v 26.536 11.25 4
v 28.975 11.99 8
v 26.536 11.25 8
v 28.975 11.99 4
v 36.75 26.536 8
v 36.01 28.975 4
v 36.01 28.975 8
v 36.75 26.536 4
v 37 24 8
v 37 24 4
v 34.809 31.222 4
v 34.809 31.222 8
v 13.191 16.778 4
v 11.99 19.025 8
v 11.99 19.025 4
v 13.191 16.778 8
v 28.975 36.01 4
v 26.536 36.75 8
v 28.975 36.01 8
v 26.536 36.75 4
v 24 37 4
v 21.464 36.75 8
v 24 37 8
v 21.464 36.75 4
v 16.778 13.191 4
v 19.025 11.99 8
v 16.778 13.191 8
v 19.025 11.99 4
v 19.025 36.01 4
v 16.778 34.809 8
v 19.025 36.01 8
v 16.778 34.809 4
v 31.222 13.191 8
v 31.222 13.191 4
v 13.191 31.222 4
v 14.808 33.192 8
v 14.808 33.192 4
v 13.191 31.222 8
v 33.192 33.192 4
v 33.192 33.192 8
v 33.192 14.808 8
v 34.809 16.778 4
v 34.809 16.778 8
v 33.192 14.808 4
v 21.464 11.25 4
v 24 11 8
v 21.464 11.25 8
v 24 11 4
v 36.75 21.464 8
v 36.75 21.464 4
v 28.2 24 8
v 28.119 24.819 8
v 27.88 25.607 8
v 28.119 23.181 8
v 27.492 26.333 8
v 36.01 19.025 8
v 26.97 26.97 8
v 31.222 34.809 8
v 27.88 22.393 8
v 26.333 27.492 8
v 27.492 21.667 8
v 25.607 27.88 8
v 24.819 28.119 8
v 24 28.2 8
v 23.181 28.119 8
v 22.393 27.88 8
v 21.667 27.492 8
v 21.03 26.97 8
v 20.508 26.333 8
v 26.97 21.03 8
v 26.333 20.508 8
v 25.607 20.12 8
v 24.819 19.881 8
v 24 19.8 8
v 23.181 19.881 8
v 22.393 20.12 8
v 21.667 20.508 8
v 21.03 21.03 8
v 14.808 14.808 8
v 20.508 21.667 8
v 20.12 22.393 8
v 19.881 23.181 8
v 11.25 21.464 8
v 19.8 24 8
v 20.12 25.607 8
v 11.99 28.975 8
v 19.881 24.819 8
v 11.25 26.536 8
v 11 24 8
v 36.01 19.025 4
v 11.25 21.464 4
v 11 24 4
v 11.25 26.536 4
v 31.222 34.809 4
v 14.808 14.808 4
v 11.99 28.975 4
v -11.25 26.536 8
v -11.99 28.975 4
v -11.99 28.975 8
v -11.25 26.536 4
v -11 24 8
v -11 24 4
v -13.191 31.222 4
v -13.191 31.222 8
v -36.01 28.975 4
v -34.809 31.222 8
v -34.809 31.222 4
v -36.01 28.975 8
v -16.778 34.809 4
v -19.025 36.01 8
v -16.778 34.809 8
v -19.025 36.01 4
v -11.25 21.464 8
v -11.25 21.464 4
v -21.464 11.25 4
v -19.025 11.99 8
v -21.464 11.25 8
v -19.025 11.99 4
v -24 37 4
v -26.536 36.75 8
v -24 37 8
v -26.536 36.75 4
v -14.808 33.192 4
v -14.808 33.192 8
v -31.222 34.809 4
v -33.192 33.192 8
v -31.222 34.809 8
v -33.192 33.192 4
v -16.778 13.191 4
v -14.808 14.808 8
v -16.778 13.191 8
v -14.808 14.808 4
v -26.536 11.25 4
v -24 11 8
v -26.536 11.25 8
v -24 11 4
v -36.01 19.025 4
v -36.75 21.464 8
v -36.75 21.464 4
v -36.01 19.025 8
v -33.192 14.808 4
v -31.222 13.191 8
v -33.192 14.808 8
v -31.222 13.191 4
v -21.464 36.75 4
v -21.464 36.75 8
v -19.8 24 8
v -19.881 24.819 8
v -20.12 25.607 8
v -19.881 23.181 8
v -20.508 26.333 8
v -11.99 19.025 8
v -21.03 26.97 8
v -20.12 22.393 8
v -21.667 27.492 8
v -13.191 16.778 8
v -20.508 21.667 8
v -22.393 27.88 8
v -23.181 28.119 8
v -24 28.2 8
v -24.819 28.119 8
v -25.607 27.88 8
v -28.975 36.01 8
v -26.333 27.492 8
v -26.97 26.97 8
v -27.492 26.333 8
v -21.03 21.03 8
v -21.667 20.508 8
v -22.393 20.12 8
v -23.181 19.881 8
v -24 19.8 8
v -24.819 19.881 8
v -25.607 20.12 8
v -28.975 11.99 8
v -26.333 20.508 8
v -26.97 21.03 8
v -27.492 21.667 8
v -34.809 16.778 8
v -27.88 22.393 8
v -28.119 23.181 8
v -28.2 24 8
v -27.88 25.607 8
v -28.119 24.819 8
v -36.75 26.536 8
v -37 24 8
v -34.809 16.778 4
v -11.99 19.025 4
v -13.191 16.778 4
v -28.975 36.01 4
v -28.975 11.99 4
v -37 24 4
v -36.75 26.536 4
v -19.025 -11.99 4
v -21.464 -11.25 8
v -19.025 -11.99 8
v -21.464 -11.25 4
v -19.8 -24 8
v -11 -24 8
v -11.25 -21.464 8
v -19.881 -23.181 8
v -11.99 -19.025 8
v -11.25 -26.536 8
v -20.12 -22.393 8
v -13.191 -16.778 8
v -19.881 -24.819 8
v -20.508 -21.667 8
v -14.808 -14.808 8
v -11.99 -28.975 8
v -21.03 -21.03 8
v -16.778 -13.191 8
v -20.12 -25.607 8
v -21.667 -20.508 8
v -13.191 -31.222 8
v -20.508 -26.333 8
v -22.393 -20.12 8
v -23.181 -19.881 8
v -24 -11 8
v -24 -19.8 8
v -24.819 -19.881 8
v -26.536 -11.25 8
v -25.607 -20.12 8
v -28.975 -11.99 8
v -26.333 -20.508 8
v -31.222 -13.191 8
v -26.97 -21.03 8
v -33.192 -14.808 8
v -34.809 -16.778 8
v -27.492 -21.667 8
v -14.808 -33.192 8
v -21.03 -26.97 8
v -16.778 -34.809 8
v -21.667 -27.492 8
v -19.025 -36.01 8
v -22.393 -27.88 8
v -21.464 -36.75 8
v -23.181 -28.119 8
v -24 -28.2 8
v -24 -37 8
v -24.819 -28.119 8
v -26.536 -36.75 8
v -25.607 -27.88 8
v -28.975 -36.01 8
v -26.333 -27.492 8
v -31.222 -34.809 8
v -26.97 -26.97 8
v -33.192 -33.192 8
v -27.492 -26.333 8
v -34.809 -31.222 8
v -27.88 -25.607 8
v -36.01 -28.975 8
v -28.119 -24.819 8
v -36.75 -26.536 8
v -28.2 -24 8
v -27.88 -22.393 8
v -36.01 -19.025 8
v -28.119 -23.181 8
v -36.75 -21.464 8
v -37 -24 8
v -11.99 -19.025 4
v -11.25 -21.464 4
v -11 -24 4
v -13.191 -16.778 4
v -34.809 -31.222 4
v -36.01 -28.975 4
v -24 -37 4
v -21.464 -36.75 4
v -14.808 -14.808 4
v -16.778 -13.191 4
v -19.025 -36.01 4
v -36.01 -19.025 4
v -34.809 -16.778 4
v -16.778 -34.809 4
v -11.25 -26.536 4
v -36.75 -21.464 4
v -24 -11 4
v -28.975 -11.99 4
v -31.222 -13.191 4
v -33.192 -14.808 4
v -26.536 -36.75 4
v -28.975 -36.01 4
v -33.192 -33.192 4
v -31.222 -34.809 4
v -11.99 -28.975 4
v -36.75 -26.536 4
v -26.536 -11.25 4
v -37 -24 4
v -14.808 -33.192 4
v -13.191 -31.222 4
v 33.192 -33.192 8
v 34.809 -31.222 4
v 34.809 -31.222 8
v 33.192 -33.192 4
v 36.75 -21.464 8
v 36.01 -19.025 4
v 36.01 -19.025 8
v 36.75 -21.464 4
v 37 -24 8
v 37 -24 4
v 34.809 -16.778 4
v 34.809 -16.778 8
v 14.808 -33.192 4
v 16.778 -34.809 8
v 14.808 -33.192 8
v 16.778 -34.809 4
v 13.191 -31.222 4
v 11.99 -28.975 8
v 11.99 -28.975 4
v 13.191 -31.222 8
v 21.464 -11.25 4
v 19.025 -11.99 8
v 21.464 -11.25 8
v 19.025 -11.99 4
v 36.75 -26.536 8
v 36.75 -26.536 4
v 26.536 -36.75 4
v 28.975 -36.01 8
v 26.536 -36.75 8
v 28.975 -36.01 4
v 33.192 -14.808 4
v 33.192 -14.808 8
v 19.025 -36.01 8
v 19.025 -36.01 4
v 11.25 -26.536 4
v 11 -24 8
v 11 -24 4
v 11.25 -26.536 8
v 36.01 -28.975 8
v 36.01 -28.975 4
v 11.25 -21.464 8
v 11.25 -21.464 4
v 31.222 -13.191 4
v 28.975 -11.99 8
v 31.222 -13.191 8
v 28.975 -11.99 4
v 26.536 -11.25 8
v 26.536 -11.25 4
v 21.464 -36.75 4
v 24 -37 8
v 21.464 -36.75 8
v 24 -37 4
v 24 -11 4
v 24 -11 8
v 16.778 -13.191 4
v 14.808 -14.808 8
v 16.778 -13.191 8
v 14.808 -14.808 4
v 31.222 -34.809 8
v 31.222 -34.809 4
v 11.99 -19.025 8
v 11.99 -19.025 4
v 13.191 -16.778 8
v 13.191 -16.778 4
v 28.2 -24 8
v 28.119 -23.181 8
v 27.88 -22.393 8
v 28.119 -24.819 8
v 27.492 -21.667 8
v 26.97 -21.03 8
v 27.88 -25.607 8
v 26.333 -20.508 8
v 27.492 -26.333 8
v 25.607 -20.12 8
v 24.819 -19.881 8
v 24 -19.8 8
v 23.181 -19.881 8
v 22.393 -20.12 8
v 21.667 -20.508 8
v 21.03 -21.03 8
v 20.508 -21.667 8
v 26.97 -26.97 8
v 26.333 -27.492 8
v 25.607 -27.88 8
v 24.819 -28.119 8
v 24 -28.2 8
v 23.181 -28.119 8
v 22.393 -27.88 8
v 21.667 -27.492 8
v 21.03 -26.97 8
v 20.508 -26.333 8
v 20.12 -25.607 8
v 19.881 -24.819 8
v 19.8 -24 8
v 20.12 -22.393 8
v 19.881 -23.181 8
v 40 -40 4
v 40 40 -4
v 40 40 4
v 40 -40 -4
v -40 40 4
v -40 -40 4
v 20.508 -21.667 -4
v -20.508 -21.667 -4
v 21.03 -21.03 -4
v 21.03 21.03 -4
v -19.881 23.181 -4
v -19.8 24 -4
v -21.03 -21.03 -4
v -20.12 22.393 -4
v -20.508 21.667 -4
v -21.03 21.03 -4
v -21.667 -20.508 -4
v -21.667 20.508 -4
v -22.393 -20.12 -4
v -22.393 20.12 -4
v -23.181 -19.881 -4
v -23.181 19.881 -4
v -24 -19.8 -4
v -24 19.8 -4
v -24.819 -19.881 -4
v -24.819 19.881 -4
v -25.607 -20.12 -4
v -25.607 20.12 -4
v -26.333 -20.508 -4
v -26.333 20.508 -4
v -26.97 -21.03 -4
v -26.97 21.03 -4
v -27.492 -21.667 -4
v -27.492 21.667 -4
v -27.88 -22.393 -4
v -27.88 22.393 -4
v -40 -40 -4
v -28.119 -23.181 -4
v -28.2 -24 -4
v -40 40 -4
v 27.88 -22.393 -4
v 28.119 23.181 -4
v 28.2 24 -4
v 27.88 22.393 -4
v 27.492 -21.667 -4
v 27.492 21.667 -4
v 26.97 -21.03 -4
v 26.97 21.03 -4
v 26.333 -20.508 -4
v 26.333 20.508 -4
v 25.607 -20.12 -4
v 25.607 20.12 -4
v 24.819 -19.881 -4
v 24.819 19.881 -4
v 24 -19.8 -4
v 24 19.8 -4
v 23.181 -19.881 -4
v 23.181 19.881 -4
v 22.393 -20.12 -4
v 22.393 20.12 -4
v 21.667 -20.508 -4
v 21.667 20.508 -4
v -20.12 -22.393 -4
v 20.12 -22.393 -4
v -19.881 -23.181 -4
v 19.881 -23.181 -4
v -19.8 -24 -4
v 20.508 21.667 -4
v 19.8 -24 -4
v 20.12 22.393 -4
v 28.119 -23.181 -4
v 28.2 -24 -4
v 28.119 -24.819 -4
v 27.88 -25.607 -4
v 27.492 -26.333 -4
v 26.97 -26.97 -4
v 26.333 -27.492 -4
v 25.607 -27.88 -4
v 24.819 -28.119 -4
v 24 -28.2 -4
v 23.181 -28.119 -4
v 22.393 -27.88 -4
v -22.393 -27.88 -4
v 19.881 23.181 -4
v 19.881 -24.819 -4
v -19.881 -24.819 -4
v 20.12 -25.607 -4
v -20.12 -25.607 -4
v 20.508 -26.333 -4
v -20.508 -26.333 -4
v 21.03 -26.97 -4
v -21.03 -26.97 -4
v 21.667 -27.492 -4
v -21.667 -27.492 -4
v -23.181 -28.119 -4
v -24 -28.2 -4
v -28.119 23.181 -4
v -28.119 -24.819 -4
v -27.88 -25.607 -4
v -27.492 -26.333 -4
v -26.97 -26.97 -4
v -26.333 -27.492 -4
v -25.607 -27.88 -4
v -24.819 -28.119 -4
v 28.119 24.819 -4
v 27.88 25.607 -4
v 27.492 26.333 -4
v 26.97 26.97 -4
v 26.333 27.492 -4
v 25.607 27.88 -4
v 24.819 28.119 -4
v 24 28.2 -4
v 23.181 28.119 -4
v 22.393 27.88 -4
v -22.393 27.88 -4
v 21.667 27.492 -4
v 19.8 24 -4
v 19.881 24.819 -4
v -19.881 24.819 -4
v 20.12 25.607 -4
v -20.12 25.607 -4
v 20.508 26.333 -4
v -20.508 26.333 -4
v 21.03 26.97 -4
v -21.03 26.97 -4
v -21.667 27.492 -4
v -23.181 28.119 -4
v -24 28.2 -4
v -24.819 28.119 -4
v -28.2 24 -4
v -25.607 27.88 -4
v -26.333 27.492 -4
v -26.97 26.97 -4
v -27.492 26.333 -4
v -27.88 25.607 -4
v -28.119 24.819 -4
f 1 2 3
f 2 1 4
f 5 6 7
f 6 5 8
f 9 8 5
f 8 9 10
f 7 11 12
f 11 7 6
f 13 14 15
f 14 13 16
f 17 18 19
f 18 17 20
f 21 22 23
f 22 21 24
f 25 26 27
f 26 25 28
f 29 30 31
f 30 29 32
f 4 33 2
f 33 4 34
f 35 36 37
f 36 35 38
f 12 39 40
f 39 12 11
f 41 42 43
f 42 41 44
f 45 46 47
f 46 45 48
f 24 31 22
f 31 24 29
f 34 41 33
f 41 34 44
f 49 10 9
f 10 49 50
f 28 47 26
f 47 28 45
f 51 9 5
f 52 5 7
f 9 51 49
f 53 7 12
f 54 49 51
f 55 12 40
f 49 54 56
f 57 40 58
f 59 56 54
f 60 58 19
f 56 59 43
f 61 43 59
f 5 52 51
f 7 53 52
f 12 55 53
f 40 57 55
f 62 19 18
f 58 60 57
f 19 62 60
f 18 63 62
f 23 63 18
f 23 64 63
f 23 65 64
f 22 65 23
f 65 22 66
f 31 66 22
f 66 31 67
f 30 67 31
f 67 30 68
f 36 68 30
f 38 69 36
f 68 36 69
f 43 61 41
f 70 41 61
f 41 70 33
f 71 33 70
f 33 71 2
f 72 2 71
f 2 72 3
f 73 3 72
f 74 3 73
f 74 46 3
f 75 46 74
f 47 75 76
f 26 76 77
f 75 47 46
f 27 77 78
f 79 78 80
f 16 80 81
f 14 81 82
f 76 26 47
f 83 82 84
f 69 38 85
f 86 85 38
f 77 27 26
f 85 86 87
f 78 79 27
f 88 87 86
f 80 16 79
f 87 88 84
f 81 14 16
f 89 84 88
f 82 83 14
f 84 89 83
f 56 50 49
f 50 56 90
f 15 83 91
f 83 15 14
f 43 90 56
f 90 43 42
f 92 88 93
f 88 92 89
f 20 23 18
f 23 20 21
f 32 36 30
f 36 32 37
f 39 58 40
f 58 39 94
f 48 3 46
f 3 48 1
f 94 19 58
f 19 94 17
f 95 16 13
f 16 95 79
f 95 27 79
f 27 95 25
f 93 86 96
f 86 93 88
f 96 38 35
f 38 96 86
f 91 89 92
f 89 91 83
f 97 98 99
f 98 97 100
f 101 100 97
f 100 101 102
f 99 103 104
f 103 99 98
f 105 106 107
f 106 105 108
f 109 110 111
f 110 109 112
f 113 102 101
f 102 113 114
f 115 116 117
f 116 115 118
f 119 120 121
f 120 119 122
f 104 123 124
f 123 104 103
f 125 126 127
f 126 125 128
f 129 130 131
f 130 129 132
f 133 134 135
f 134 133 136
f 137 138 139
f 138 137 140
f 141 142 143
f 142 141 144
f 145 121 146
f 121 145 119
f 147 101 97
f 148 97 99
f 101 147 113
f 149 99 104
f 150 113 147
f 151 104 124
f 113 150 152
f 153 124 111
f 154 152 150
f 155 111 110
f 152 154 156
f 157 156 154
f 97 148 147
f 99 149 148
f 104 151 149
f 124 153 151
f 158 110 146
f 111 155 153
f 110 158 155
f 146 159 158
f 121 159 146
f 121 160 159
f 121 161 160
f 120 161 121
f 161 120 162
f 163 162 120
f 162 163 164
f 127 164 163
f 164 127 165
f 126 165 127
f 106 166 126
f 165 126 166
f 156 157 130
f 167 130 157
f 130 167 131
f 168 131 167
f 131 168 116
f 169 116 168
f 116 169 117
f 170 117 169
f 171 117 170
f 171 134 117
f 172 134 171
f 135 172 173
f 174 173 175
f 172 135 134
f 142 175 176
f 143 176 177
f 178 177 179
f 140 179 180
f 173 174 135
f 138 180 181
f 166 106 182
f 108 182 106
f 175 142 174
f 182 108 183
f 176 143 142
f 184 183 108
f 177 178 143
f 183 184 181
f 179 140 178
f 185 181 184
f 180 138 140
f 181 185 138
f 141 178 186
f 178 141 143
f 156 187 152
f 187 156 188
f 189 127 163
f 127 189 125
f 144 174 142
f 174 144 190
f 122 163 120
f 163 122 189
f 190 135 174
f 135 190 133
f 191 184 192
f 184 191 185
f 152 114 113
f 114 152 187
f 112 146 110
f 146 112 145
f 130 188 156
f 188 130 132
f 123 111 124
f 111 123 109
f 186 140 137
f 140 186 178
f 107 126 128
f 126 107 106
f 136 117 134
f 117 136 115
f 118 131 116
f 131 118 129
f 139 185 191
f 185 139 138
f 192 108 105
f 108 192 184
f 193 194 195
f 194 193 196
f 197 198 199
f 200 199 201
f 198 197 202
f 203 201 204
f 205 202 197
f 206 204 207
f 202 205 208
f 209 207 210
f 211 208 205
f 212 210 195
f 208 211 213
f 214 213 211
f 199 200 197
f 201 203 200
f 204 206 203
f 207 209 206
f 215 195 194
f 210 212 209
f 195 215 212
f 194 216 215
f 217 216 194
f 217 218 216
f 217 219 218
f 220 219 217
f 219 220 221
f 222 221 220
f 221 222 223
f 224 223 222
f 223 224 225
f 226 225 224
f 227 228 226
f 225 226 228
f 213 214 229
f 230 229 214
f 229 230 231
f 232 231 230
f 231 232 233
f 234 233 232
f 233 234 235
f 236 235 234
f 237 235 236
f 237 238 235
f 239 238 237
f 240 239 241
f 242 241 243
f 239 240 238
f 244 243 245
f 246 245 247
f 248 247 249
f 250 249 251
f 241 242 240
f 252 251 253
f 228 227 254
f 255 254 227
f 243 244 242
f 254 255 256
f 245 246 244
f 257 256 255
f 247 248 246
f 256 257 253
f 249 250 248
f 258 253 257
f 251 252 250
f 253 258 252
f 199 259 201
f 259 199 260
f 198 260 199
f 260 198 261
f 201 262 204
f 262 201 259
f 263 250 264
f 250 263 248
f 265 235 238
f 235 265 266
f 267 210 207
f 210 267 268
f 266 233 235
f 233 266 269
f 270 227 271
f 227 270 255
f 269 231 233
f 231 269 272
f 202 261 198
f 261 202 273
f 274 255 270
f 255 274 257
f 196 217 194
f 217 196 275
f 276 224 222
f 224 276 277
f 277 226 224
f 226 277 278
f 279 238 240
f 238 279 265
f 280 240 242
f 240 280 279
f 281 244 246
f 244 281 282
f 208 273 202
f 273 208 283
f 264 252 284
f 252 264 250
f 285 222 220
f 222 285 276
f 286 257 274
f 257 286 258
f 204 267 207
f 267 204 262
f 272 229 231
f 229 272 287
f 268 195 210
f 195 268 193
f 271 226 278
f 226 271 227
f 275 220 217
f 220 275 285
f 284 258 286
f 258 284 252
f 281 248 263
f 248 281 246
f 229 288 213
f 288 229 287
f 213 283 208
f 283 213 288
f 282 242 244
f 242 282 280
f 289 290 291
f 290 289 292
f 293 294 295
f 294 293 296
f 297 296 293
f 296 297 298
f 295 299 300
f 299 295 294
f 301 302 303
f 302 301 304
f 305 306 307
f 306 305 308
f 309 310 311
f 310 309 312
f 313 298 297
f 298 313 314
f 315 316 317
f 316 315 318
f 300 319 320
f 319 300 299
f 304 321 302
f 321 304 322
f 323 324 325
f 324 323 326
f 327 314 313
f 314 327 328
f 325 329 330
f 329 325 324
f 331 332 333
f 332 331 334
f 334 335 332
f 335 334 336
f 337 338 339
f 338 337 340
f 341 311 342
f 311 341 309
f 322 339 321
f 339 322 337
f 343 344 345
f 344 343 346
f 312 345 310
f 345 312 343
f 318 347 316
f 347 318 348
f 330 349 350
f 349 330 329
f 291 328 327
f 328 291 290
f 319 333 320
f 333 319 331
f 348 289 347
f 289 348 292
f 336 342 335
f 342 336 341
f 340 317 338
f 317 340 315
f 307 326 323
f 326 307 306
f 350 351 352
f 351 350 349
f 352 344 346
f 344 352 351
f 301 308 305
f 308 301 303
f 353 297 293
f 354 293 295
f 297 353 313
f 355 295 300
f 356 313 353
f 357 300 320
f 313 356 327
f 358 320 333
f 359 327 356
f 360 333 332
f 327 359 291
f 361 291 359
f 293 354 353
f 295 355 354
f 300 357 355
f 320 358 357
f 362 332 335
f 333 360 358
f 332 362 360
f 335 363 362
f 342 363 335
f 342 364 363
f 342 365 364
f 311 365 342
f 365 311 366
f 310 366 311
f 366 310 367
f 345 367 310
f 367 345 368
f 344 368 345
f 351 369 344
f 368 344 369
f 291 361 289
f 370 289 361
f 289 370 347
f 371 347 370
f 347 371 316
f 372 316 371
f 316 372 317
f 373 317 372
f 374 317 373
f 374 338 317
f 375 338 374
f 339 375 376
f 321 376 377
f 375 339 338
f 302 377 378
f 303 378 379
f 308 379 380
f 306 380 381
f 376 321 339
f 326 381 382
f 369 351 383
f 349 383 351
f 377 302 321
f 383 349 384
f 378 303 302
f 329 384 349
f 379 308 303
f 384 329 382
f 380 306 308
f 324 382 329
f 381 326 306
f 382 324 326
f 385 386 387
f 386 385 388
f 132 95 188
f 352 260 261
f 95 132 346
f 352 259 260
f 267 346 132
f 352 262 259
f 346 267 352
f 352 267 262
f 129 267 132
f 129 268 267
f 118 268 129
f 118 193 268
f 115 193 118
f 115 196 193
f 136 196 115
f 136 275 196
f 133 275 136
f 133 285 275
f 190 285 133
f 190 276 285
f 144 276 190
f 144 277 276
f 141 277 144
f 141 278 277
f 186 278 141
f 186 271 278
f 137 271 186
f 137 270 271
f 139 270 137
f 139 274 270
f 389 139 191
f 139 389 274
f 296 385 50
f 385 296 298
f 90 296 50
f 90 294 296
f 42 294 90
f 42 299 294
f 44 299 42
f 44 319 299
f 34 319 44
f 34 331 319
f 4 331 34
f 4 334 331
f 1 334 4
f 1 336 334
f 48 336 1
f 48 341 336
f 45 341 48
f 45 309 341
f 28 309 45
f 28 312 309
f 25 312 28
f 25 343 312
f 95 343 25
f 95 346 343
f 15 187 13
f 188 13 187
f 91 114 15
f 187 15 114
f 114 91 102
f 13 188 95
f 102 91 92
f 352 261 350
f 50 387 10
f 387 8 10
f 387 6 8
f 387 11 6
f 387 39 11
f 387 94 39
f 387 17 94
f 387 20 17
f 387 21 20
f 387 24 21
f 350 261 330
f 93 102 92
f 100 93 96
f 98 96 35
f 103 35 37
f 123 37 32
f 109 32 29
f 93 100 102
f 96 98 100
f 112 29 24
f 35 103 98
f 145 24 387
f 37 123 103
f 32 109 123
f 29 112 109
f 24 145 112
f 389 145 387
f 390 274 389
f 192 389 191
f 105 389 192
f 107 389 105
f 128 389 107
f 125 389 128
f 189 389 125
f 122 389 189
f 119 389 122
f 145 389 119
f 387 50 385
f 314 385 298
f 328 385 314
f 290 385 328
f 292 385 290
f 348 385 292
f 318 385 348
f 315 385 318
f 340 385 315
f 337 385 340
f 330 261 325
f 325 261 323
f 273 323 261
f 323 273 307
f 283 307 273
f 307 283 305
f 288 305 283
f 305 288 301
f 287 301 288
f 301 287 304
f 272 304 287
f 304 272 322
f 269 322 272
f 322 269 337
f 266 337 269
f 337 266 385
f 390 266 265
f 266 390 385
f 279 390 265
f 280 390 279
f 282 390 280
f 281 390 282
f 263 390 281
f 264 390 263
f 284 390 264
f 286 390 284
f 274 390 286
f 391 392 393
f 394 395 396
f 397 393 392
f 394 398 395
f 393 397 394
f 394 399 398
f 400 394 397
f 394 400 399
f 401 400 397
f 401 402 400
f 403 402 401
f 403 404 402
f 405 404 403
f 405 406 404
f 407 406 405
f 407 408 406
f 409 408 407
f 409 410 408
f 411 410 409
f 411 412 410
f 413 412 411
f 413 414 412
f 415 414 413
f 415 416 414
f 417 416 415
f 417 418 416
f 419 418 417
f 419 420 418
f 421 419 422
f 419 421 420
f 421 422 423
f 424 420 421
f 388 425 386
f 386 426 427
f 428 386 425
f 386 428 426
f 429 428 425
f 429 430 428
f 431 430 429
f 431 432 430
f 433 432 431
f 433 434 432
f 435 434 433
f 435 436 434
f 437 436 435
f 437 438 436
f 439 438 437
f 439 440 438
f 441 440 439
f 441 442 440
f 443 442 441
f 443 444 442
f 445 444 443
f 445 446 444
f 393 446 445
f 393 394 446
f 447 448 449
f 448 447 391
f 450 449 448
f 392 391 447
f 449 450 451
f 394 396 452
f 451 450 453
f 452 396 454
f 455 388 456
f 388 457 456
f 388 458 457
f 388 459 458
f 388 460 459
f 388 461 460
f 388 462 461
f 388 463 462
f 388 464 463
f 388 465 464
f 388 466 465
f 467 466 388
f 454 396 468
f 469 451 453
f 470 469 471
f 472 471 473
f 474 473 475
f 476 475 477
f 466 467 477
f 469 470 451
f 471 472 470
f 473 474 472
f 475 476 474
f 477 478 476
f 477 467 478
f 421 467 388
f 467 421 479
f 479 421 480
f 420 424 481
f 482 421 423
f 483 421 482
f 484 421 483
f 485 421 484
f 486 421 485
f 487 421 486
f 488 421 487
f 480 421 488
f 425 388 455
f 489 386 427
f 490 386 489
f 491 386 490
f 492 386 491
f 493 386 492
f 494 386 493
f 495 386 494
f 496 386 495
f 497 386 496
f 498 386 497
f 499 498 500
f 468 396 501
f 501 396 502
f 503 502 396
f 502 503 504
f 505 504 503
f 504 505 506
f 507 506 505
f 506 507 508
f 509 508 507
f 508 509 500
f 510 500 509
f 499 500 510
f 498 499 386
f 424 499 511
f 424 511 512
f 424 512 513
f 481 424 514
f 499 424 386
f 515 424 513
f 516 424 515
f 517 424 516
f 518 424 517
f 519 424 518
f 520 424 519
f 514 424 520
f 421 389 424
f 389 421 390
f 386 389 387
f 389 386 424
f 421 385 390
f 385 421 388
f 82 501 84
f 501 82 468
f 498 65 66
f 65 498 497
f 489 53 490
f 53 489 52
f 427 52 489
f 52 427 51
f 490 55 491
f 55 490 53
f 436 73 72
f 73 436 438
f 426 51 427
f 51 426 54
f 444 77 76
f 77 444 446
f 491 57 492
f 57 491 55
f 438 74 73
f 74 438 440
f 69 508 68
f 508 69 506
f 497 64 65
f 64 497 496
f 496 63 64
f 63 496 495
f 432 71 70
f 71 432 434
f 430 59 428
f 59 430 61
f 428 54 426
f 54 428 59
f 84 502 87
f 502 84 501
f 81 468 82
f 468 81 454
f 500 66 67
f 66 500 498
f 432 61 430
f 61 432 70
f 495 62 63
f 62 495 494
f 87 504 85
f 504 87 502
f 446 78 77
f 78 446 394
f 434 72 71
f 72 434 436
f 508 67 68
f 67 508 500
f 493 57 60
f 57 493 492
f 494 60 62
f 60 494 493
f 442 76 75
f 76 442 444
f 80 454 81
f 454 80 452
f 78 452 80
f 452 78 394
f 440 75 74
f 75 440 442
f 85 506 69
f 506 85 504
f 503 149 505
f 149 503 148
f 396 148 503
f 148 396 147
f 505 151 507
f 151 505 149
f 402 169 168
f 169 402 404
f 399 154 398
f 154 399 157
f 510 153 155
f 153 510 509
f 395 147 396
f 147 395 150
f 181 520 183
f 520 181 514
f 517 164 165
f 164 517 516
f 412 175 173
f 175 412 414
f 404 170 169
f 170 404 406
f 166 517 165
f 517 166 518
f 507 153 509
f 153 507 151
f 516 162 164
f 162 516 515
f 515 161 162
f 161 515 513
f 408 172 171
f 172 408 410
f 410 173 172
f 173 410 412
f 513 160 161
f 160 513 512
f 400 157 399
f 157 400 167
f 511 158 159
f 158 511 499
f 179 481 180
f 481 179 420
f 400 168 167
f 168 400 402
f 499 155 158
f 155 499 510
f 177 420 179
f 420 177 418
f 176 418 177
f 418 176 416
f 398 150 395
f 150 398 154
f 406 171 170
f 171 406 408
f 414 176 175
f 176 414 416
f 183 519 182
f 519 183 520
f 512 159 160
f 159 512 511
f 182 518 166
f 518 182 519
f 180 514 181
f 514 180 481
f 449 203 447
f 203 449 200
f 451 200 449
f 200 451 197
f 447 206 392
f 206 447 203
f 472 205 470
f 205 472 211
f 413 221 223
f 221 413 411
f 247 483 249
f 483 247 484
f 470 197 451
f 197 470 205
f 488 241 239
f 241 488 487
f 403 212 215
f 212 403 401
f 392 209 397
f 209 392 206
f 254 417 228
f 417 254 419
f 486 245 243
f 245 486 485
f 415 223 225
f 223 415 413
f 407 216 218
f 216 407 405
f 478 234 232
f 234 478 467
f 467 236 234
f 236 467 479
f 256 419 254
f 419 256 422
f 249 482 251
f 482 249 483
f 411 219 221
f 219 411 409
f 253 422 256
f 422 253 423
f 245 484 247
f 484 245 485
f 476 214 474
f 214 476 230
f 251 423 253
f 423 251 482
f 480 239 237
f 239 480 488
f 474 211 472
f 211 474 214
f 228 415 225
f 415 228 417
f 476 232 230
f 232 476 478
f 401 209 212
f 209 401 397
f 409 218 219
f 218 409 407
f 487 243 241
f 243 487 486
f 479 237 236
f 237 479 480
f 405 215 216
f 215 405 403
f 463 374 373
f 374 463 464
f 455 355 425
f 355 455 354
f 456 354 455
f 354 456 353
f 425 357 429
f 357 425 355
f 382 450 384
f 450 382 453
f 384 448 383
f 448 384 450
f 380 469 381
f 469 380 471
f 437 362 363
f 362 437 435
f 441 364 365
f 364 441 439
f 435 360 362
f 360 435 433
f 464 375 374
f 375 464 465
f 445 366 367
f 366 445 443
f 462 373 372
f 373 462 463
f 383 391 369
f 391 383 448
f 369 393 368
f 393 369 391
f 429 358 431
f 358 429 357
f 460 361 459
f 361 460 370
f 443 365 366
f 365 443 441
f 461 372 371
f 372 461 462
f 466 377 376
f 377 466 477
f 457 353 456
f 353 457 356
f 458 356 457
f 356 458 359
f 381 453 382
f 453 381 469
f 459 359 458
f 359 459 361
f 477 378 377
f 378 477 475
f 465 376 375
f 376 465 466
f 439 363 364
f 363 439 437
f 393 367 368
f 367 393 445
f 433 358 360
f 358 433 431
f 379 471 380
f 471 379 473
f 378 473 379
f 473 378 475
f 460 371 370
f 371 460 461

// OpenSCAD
$fn = 32;

// ----------------------------------------------------------------------
// Anchor pads 80 x 80 x 12
// four corner bosses with anchor holes
// ----------------------------------------------------------------------

// --- parameters (mm) ---
plate = [80, 80, 8];  // base plate size (x, y, z)
pads = 4;             // boss count, one per corner
edge = 16;            // boss centre offset from the plate edge
boss_d = 26;          // boss diameter
boss_h = 4;           // boss height above the base plate
hole_d = 8.4;         // hole diameter

// --- derived feature positions (mm) ---
height = plate[2] + boss_h;      // = 12   overall height of the part
corner_x = plate[0] / 2 - edge;  // = 24   boss centre X
corner_y = plate[1] / 2 - edge;  // = 24   boss centre Y
feature_centers = [
  [corner_x, corner_y],
  [-corner_x, corner_y],
  [-corner_x, -corner_y],
  [corner_x, -corner_y]
];   // boss centres, anchor holes are drilled there

// base plate, four bosses standing on it, anchor holes all the way through
difference() {
  union() {
    cube(plate, center = true);
    for (centre = feature_centers)
      translate([centre[0], centre[1], plate[2] / 2 - 1])
        cylinder(d = boss_d, h = boss_h + 1);
  }
  for (centre = feature_centers)
    translate([centre[0], centre[1], -height])
      cylinder(d = hole_d, h = 2 * height + 2);  // through boss and plate
}
